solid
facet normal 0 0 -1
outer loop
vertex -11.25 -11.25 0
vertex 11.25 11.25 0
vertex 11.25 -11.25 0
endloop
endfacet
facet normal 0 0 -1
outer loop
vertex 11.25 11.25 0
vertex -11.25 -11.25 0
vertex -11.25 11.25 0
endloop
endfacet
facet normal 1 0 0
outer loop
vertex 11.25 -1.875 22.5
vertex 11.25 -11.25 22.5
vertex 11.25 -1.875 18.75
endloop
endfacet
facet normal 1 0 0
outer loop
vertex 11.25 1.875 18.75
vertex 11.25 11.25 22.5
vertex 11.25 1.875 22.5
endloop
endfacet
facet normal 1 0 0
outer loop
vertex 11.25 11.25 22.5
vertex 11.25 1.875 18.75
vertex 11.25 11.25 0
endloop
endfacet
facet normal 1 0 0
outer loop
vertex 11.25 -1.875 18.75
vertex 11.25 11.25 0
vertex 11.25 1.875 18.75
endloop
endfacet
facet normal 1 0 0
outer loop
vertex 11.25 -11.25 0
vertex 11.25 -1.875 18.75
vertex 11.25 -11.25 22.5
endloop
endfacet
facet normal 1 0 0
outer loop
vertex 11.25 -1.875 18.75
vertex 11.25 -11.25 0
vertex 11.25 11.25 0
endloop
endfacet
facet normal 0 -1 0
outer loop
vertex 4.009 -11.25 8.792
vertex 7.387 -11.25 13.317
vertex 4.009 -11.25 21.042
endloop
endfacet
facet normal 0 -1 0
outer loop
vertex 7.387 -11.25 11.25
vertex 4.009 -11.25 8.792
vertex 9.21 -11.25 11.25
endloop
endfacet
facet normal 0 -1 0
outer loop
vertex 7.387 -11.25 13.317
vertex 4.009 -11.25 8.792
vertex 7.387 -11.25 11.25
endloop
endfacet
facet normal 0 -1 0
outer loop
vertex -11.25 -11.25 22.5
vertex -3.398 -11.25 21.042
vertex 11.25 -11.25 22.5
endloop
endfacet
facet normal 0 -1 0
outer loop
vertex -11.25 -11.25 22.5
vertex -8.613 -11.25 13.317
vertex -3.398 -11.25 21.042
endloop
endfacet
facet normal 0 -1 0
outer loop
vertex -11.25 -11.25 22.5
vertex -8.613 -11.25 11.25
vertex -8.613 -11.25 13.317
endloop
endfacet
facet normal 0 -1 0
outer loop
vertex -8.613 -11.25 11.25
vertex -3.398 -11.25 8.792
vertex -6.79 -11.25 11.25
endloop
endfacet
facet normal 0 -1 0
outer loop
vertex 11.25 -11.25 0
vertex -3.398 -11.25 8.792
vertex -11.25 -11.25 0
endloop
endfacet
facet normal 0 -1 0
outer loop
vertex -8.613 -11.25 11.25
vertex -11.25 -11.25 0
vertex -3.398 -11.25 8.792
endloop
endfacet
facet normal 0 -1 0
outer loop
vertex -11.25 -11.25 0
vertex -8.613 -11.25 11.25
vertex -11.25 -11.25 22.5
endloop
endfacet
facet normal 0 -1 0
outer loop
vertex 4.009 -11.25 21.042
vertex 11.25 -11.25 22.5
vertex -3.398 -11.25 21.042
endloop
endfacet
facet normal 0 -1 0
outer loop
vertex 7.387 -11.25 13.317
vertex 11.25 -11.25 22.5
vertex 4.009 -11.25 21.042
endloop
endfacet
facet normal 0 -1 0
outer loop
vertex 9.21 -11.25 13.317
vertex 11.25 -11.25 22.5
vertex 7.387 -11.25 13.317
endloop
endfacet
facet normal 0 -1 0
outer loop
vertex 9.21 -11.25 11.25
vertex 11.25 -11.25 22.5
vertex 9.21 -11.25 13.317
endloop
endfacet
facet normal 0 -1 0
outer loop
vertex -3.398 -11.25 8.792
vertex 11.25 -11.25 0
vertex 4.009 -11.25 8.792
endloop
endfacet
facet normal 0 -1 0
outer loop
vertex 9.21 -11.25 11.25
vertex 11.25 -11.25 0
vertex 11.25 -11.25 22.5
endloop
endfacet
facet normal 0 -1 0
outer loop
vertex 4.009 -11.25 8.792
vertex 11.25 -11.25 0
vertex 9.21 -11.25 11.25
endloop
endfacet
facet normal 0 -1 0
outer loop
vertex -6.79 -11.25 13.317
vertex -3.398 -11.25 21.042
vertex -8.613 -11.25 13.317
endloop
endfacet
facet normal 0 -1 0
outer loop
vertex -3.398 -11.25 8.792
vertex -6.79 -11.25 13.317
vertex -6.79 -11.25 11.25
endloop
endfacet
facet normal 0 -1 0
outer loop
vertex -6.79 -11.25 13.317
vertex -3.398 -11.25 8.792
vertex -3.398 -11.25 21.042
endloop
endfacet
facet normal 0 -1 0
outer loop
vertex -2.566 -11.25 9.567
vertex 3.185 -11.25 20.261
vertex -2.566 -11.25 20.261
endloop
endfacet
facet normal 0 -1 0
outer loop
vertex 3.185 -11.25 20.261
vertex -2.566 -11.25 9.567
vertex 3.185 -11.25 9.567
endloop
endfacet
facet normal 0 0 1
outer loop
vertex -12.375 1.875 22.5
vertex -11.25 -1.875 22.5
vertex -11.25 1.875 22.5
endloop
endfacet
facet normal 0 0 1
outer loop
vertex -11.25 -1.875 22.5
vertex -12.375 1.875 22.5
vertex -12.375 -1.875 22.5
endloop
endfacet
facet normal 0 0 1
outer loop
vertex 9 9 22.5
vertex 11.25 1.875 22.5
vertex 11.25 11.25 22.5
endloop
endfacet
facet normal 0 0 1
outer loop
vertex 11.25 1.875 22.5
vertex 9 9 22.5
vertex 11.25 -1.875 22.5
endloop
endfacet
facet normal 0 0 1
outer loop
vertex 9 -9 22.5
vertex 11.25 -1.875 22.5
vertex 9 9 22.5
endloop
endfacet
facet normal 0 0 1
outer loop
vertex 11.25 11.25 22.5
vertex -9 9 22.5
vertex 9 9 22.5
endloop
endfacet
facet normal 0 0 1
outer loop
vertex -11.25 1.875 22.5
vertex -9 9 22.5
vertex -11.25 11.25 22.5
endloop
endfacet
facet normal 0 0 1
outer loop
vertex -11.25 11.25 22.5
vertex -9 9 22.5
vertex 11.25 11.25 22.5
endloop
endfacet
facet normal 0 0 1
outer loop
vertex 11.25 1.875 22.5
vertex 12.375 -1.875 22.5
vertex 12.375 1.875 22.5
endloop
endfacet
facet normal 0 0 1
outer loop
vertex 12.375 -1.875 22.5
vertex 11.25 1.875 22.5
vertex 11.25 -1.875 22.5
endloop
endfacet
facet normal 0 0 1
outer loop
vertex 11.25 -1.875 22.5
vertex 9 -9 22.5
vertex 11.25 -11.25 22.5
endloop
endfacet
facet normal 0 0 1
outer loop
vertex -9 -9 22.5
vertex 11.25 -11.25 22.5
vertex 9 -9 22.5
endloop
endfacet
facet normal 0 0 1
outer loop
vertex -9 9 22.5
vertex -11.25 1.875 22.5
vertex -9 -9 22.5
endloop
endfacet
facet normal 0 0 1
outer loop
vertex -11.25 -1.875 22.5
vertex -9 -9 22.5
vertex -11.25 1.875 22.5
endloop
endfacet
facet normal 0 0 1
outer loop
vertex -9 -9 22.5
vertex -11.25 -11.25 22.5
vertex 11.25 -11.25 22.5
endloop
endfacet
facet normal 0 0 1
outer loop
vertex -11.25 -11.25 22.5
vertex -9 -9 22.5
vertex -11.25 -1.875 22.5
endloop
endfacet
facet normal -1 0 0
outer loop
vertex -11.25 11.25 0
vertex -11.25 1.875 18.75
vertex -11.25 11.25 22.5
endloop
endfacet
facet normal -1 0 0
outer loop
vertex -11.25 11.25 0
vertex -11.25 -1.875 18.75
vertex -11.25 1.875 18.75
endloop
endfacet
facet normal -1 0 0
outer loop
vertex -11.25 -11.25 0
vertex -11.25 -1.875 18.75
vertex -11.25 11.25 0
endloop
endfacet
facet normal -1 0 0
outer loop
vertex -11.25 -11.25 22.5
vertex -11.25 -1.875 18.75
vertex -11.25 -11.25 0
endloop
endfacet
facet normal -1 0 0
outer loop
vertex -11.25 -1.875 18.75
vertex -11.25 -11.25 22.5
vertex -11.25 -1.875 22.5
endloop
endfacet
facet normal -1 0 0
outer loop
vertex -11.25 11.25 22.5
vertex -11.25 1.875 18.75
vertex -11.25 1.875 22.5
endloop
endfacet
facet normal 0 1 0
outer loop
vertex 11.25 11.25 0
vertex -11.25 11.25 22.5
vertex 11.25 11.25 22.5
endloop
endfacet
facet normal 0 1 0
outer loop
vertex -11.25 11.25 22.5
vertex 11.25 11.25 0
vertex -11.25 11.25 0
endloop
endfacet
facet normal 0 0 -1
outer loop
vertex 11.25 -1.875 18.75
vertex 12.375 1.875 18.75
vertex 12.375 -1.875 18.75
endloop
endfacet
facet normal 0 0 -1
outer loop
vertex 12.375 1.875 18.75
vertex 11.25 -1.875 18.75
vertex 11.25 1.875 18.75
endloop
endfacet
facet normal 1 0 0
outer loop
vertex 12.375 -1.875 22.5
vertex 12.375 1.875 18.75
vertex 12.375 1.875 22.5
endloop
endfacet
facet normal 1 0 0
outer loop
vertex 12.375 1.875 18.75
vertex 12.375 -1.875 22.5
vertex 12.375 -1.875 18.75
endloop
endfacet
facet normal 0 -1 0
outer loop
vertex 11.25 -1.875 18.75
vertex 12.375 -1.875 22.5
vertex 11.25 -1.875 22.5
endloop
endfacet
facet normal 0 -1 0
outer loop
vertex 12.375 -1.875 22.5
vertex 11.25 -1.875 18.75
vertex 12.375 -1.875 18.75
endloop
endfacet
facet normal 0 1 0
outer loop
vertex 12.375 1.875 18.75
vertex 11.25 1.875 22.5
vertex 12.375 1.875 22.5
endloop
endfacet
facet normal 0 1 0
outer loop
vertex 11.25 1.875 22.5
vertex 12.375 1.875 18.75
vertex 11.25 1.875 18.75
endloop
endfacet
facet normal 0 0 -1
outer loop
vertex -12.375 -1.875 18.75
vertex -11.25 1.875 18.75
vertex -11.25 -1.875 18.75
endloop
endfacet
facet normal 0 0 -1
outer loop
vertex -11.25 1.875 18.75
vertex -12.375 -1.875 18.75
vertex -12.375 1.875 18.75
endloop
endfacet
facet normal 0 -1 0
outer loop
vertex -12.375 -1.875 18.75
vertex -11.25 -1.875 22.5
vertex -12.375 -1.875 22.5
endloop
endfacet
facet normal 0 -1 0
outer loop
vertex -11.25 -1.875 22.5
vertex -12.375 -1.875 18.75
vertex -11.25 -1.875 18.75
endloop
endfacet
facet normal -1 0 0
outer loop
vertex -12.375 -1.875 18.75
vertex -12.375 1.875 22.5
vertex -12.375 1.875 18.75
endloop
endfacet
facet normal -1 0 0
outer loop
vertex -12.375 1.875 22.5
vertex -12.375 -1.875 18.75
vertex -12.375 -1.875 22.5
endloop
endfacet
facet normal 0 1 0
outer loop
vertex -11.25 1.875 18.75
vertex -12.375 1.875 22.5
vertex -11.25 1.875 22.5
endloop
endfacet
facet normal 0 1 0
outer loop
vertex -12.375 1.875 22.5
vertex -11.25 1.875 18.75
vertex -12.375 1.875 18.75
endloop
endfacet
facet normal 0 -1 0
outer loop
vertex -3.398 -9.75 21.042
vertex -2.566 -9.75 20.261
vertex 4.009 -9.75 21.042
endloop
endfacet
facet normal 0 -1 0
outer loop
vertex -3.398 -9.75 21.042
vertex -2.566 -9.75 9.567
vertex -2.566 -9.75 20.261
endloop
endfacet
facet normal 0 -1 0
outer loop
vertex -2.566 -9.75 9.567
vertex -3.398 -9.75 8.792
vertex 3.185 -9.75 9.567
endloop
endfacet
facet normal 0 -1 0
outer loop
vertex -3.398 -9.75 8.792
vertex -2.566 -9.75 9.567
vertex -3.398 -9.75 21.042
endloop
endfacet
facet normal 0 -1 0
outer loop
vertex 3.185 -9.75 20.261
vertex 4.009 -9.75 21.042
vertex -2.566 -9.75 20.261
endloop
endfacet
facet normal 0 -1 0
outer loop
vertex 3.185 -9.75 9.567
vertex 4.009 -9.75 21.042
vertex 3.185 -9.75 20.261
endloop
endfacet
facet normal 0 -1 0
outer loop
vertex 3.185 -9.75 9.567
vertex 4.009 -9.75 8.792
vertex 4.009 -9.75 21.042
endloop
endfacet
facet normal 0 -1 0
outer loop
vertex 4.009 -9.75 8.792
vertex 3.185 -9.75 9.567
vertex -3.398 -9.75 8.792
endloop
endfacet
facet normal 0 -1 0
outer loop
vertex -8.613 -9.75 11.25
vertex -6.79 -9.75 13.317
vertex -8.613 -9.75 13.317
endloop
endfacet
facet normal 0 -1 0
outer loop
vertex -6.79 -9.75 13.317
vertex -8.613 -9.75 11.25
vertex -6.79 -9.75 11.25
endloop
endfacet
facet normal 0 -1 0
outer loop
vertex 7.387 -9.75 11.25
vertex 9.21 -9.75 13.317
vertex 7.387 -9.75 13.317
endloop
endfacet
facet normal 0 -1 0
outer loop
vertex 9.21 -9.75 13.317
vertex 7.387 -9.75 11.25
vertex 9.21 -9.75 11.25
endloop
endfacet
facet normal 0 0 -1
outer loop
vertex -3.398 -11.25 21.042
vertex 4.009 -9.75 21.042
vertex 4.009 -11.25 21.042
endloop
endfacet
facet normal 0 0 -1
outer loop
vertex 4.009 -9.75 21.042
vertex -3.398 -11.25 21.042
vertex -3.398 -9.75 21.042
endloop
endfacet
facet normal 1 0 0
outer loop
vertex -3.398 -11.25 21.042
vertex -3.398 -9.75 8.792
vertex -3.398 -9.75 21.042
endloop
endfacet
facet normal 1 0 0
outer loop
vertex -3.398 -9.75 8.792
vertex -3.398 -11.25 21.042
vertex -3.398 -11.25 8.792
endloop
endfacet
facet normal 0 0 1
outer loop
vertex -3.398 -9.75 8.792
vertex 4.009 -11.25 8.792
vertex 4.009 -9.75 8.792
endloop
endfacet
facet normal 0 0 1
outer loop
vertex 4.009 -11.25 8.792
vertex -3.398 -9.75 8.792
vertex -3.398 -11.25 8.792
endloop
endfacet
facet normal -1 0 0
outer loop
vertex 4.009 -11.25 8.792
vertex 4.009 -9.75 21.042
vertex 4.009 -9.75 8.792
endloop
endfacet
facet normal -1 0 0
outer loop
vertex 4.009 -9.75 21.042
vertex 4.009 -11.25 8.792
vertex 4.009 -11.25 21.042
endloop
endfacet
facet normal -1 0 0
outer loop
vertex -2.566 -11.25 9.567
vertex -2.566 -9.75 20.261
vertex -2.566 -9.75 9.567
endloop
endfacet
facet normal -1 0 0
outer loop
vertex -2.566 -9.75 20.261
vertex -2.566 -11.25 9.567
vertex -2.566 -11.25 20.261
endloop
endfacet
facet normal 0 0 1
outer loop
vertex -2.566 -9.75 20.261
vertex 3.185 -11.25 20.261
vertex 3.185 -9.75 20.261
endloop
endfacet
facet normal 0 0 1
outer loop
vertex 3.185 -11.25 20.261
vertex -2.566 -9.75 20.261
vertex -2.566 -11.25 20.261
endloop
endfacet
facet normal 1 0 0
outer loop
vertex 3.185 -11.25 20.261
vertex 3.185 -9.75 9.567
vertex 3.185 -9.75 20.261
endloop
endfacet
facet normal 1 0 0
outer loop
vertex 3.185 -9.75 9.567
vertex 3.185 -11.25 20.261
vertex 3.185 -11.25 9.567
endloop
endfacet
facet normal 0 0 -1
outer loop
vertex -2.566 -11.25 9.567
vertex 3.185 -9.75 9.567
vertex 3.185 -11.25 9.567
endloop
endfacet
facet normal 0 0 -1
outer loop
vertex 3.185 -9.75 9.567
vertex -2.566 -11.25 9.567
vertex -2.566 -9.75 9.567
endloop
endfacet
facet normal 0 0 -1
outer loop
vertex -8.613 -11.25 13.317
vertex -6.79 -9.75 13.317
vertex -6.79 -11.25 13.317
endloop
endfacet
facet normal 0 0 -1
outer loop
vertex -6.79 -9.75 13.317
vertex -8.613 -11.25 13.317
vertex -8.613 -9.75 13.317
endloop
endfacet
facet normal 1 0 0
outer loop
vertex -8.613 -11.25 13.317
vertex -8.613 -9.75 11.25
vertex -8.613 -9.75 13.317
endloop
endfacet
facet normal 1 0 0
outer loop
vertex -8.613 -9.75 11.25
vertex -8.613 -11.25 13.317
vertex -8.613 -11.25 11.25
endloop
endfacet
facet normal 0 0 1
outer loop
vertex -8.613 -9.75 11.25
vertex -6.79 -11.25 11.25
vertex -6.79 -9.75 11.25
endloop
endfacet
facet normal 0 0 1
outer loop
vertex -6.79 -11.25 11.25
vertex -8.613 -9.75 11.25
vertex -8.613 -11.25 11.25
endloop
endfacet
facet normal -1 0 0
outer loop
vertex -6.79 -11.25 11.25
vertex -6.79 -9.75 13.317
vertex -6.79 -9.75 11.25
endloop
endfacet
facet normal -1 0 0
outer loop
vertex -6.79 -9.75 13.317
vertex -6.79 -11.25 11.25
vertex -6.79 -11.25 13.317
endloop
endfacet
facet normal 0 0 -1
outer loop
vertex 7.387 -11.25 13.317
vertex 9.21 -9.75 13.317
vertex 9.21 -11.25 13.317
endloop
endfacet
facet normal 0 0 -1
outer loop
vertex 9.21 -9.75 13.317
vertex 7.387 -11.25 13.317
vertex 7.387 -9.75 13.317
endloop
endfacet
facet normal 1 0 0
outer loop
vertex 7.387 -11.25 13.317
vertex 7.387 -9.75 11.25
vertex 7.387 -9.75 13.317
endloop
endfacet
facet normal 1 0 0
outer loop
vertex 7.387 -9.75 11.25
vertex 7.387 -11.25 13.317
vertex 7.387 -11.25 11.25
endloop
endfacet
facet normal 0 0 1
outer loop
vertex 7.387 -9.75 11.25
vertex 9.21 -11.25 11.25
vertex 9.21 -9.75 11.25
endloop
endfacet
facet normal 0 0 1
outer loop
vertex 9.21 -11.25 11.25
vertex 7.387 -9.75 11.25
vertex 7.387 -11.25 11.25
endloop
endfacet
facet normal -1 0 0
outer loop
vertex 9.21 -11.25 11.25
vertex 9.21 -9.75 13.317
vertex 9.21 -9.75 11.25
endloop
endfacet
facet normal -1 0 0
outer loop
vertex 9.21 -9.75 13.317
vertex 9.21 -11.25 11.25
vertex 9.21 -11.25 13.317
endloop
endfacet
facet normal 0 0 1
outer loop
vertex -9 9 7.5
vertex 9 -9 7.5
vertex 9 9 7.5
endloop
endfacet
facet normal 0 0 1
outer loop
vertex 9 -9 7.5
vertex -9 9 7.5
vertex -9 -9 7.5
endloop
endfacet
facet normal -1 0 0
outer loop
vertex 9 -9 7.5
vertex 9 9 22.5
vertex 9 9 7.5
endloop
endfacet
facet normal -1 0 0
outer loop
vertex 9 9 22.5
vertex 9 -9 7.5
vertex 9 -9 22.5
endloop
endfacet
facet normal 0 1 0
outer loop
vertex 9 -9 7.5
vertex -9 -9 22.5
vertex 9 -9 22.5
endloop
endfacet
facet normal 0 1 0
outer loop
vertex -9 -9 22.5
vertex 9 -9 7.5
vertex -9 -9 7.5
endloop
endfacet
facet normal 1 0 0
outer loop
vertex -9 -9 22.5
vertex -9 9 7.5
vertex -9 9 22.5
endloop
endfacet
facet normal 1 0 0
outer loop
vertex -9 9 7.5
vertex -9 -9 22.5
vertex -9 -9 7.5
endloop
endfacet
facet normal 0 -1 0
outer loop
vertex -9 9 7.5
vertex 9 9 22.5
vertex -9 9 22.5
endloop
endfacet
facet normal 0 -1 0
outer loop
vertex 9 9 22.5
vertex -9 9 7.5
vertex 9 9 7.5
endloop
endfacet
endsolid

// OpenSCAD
difference()
{
    difference()
    {
        difference()
        {
            union()
            {
                union()
                {
                    linear_extrude(height = 22.5, twist = 0.0, scale = 1.0, slices = 1, center = false)
                    {
                        scale([22.5, 22.5])
                        {
                            M22();
                        }
                    }
                    translate([10.5, 0.0, 0.0])
                    {
                        translate([0.0, 0.0, 18.75])
                        {
                            linear_extrude(height = 3.75, twist = 0.0, scale = 1.0, slices = 1, center = false)
                            {
                                scale([3.75, 3.75])
                                {
                                    M22();
                                }
                            }
                        }
                    }
                }
                translate([-10.5, 0.0, 0.0])
                {
                    translate([0.0, 0.0, 18.75])
                    {
                        linear_extrude(height = 3.75, twist = 0.0, scale = 1.0, slices = 1, center = false)
                        {
                            scale([3.75, 3.75])
                            {
                                M22();
                            }
                        }
                    }
                }
            }
            translate([10.799999999999999, 0.0, 0.0])
            {
                translate([0.0, 0.0, 20.625])
                {
                    intersection()
                    {
                        rotate_extrude(angle = 360.0, $fn = 128)
                        {
                            M380();
                        }
                        translate([0.0, 0.0, -0.2])
                        {
                            linear_extrude(height = 4.15, twist = 0.0, scale = 1.0, slices = 1, center = false)
                            {
                                scale([1.875, 3.75])
                                {
                                    M22();
                                }
                            }
                        }
                    }
                }
            }
        }
        translate([-10.799999999999999, 0.0, 0.0])
        {
            translate([0.0, 0.0, 20.625])
            {
                intersection()
                {
                    rotate_extrude(angle = 360.0, $fn = 128)
                    {
                        M380();
                    }
                    translate([0.0, 0.0, -0.2])
                    {
                        linear_extrude(height = 4.15, twist = 0.0, scale = 1.0, slices = 1, center = false)
                        {
                            scale([1.875, 3.75])
                            {
                                M22();
                            }
                        }
                    }
                }
            }
        }
    }
    rotate([90.0, 0.0, 0.0])
    {
        translate([0.0, 11.25, 0.0])
        {
            translate([0.0, 0.0, 11.25])
            {
                translate([-12.15, 0.0, 0.0])
                {
                    linear_extrude(height = 3.0, twist = 0.0, scale = 1.0, slices = 1, center = true)
                    {
                        union()
                        {
                            translate([0.0, 0.0])
                            {
                                M383();
                            }
                            translate([8.0, 0.0])
                            {
                                M384();
                            }
                            translate([16.0, 0.0])
                            {
                                M383();
                            }
                        }
                    }
                }
            }
        }
    }
    translate([0.0, 0.0, 7.5])
    {
        linear_extrude(height = 64.0, twist = 0.0, scale = 1.0, slices = 1, center = false)
        {
            scale([18.0, 18.0])
            {
                M22();
            }
        }
    }
}

module M384()
{
    scale([1.0666666666666667, 1.0])
    {
        text
        (
            text = "͜",
            size = 10.0,
            font = "Consolas:style=Regular",
            halign = "left",
            valign = "baseline",
            spacing = 1.0,
            direction = "ltr",
            language = "en",
            script = "latin",
            $fn = 64
        );
    }
}

module M22()
{
    polygon
    (
        points =
        [
            [-0.5, -0.5], 
            [0.5, -0.5], 
            [0.5, 0.5], 
            [-0.5, 0.5]
        ],
        paths =
        [
            [0, 1, 2, 3]
        ]
    );
}

module M380()
{
    polygon
    (
        points =
        [
            [0.0, -0.2], 
            [1.6, -0.2], 
            [1.6, 0.775], 
            [1.225, 1.15], 
            [1.225, 0.725], 
            [1.6, 1.1], 
            [1.6, 2.075], 
            [0.0, 2.075]
        ],
        paths =
        [
            [0, 1, 2, 3, 4, 5, 6, 7]
        ]
    );
}

module M383()
{
    scale([1.0666666666666667, 1.0])
    {
        text
        (
            text = ".",
            size = 10.0,
            font = "Consolas:style=Regular",
            halign = "left",
            valign = "baseline",
            spacing = 1.0,
            direction = "ltr",
            language = "en",
            script = "latin",
            $fn = 64
        );
    }
}
